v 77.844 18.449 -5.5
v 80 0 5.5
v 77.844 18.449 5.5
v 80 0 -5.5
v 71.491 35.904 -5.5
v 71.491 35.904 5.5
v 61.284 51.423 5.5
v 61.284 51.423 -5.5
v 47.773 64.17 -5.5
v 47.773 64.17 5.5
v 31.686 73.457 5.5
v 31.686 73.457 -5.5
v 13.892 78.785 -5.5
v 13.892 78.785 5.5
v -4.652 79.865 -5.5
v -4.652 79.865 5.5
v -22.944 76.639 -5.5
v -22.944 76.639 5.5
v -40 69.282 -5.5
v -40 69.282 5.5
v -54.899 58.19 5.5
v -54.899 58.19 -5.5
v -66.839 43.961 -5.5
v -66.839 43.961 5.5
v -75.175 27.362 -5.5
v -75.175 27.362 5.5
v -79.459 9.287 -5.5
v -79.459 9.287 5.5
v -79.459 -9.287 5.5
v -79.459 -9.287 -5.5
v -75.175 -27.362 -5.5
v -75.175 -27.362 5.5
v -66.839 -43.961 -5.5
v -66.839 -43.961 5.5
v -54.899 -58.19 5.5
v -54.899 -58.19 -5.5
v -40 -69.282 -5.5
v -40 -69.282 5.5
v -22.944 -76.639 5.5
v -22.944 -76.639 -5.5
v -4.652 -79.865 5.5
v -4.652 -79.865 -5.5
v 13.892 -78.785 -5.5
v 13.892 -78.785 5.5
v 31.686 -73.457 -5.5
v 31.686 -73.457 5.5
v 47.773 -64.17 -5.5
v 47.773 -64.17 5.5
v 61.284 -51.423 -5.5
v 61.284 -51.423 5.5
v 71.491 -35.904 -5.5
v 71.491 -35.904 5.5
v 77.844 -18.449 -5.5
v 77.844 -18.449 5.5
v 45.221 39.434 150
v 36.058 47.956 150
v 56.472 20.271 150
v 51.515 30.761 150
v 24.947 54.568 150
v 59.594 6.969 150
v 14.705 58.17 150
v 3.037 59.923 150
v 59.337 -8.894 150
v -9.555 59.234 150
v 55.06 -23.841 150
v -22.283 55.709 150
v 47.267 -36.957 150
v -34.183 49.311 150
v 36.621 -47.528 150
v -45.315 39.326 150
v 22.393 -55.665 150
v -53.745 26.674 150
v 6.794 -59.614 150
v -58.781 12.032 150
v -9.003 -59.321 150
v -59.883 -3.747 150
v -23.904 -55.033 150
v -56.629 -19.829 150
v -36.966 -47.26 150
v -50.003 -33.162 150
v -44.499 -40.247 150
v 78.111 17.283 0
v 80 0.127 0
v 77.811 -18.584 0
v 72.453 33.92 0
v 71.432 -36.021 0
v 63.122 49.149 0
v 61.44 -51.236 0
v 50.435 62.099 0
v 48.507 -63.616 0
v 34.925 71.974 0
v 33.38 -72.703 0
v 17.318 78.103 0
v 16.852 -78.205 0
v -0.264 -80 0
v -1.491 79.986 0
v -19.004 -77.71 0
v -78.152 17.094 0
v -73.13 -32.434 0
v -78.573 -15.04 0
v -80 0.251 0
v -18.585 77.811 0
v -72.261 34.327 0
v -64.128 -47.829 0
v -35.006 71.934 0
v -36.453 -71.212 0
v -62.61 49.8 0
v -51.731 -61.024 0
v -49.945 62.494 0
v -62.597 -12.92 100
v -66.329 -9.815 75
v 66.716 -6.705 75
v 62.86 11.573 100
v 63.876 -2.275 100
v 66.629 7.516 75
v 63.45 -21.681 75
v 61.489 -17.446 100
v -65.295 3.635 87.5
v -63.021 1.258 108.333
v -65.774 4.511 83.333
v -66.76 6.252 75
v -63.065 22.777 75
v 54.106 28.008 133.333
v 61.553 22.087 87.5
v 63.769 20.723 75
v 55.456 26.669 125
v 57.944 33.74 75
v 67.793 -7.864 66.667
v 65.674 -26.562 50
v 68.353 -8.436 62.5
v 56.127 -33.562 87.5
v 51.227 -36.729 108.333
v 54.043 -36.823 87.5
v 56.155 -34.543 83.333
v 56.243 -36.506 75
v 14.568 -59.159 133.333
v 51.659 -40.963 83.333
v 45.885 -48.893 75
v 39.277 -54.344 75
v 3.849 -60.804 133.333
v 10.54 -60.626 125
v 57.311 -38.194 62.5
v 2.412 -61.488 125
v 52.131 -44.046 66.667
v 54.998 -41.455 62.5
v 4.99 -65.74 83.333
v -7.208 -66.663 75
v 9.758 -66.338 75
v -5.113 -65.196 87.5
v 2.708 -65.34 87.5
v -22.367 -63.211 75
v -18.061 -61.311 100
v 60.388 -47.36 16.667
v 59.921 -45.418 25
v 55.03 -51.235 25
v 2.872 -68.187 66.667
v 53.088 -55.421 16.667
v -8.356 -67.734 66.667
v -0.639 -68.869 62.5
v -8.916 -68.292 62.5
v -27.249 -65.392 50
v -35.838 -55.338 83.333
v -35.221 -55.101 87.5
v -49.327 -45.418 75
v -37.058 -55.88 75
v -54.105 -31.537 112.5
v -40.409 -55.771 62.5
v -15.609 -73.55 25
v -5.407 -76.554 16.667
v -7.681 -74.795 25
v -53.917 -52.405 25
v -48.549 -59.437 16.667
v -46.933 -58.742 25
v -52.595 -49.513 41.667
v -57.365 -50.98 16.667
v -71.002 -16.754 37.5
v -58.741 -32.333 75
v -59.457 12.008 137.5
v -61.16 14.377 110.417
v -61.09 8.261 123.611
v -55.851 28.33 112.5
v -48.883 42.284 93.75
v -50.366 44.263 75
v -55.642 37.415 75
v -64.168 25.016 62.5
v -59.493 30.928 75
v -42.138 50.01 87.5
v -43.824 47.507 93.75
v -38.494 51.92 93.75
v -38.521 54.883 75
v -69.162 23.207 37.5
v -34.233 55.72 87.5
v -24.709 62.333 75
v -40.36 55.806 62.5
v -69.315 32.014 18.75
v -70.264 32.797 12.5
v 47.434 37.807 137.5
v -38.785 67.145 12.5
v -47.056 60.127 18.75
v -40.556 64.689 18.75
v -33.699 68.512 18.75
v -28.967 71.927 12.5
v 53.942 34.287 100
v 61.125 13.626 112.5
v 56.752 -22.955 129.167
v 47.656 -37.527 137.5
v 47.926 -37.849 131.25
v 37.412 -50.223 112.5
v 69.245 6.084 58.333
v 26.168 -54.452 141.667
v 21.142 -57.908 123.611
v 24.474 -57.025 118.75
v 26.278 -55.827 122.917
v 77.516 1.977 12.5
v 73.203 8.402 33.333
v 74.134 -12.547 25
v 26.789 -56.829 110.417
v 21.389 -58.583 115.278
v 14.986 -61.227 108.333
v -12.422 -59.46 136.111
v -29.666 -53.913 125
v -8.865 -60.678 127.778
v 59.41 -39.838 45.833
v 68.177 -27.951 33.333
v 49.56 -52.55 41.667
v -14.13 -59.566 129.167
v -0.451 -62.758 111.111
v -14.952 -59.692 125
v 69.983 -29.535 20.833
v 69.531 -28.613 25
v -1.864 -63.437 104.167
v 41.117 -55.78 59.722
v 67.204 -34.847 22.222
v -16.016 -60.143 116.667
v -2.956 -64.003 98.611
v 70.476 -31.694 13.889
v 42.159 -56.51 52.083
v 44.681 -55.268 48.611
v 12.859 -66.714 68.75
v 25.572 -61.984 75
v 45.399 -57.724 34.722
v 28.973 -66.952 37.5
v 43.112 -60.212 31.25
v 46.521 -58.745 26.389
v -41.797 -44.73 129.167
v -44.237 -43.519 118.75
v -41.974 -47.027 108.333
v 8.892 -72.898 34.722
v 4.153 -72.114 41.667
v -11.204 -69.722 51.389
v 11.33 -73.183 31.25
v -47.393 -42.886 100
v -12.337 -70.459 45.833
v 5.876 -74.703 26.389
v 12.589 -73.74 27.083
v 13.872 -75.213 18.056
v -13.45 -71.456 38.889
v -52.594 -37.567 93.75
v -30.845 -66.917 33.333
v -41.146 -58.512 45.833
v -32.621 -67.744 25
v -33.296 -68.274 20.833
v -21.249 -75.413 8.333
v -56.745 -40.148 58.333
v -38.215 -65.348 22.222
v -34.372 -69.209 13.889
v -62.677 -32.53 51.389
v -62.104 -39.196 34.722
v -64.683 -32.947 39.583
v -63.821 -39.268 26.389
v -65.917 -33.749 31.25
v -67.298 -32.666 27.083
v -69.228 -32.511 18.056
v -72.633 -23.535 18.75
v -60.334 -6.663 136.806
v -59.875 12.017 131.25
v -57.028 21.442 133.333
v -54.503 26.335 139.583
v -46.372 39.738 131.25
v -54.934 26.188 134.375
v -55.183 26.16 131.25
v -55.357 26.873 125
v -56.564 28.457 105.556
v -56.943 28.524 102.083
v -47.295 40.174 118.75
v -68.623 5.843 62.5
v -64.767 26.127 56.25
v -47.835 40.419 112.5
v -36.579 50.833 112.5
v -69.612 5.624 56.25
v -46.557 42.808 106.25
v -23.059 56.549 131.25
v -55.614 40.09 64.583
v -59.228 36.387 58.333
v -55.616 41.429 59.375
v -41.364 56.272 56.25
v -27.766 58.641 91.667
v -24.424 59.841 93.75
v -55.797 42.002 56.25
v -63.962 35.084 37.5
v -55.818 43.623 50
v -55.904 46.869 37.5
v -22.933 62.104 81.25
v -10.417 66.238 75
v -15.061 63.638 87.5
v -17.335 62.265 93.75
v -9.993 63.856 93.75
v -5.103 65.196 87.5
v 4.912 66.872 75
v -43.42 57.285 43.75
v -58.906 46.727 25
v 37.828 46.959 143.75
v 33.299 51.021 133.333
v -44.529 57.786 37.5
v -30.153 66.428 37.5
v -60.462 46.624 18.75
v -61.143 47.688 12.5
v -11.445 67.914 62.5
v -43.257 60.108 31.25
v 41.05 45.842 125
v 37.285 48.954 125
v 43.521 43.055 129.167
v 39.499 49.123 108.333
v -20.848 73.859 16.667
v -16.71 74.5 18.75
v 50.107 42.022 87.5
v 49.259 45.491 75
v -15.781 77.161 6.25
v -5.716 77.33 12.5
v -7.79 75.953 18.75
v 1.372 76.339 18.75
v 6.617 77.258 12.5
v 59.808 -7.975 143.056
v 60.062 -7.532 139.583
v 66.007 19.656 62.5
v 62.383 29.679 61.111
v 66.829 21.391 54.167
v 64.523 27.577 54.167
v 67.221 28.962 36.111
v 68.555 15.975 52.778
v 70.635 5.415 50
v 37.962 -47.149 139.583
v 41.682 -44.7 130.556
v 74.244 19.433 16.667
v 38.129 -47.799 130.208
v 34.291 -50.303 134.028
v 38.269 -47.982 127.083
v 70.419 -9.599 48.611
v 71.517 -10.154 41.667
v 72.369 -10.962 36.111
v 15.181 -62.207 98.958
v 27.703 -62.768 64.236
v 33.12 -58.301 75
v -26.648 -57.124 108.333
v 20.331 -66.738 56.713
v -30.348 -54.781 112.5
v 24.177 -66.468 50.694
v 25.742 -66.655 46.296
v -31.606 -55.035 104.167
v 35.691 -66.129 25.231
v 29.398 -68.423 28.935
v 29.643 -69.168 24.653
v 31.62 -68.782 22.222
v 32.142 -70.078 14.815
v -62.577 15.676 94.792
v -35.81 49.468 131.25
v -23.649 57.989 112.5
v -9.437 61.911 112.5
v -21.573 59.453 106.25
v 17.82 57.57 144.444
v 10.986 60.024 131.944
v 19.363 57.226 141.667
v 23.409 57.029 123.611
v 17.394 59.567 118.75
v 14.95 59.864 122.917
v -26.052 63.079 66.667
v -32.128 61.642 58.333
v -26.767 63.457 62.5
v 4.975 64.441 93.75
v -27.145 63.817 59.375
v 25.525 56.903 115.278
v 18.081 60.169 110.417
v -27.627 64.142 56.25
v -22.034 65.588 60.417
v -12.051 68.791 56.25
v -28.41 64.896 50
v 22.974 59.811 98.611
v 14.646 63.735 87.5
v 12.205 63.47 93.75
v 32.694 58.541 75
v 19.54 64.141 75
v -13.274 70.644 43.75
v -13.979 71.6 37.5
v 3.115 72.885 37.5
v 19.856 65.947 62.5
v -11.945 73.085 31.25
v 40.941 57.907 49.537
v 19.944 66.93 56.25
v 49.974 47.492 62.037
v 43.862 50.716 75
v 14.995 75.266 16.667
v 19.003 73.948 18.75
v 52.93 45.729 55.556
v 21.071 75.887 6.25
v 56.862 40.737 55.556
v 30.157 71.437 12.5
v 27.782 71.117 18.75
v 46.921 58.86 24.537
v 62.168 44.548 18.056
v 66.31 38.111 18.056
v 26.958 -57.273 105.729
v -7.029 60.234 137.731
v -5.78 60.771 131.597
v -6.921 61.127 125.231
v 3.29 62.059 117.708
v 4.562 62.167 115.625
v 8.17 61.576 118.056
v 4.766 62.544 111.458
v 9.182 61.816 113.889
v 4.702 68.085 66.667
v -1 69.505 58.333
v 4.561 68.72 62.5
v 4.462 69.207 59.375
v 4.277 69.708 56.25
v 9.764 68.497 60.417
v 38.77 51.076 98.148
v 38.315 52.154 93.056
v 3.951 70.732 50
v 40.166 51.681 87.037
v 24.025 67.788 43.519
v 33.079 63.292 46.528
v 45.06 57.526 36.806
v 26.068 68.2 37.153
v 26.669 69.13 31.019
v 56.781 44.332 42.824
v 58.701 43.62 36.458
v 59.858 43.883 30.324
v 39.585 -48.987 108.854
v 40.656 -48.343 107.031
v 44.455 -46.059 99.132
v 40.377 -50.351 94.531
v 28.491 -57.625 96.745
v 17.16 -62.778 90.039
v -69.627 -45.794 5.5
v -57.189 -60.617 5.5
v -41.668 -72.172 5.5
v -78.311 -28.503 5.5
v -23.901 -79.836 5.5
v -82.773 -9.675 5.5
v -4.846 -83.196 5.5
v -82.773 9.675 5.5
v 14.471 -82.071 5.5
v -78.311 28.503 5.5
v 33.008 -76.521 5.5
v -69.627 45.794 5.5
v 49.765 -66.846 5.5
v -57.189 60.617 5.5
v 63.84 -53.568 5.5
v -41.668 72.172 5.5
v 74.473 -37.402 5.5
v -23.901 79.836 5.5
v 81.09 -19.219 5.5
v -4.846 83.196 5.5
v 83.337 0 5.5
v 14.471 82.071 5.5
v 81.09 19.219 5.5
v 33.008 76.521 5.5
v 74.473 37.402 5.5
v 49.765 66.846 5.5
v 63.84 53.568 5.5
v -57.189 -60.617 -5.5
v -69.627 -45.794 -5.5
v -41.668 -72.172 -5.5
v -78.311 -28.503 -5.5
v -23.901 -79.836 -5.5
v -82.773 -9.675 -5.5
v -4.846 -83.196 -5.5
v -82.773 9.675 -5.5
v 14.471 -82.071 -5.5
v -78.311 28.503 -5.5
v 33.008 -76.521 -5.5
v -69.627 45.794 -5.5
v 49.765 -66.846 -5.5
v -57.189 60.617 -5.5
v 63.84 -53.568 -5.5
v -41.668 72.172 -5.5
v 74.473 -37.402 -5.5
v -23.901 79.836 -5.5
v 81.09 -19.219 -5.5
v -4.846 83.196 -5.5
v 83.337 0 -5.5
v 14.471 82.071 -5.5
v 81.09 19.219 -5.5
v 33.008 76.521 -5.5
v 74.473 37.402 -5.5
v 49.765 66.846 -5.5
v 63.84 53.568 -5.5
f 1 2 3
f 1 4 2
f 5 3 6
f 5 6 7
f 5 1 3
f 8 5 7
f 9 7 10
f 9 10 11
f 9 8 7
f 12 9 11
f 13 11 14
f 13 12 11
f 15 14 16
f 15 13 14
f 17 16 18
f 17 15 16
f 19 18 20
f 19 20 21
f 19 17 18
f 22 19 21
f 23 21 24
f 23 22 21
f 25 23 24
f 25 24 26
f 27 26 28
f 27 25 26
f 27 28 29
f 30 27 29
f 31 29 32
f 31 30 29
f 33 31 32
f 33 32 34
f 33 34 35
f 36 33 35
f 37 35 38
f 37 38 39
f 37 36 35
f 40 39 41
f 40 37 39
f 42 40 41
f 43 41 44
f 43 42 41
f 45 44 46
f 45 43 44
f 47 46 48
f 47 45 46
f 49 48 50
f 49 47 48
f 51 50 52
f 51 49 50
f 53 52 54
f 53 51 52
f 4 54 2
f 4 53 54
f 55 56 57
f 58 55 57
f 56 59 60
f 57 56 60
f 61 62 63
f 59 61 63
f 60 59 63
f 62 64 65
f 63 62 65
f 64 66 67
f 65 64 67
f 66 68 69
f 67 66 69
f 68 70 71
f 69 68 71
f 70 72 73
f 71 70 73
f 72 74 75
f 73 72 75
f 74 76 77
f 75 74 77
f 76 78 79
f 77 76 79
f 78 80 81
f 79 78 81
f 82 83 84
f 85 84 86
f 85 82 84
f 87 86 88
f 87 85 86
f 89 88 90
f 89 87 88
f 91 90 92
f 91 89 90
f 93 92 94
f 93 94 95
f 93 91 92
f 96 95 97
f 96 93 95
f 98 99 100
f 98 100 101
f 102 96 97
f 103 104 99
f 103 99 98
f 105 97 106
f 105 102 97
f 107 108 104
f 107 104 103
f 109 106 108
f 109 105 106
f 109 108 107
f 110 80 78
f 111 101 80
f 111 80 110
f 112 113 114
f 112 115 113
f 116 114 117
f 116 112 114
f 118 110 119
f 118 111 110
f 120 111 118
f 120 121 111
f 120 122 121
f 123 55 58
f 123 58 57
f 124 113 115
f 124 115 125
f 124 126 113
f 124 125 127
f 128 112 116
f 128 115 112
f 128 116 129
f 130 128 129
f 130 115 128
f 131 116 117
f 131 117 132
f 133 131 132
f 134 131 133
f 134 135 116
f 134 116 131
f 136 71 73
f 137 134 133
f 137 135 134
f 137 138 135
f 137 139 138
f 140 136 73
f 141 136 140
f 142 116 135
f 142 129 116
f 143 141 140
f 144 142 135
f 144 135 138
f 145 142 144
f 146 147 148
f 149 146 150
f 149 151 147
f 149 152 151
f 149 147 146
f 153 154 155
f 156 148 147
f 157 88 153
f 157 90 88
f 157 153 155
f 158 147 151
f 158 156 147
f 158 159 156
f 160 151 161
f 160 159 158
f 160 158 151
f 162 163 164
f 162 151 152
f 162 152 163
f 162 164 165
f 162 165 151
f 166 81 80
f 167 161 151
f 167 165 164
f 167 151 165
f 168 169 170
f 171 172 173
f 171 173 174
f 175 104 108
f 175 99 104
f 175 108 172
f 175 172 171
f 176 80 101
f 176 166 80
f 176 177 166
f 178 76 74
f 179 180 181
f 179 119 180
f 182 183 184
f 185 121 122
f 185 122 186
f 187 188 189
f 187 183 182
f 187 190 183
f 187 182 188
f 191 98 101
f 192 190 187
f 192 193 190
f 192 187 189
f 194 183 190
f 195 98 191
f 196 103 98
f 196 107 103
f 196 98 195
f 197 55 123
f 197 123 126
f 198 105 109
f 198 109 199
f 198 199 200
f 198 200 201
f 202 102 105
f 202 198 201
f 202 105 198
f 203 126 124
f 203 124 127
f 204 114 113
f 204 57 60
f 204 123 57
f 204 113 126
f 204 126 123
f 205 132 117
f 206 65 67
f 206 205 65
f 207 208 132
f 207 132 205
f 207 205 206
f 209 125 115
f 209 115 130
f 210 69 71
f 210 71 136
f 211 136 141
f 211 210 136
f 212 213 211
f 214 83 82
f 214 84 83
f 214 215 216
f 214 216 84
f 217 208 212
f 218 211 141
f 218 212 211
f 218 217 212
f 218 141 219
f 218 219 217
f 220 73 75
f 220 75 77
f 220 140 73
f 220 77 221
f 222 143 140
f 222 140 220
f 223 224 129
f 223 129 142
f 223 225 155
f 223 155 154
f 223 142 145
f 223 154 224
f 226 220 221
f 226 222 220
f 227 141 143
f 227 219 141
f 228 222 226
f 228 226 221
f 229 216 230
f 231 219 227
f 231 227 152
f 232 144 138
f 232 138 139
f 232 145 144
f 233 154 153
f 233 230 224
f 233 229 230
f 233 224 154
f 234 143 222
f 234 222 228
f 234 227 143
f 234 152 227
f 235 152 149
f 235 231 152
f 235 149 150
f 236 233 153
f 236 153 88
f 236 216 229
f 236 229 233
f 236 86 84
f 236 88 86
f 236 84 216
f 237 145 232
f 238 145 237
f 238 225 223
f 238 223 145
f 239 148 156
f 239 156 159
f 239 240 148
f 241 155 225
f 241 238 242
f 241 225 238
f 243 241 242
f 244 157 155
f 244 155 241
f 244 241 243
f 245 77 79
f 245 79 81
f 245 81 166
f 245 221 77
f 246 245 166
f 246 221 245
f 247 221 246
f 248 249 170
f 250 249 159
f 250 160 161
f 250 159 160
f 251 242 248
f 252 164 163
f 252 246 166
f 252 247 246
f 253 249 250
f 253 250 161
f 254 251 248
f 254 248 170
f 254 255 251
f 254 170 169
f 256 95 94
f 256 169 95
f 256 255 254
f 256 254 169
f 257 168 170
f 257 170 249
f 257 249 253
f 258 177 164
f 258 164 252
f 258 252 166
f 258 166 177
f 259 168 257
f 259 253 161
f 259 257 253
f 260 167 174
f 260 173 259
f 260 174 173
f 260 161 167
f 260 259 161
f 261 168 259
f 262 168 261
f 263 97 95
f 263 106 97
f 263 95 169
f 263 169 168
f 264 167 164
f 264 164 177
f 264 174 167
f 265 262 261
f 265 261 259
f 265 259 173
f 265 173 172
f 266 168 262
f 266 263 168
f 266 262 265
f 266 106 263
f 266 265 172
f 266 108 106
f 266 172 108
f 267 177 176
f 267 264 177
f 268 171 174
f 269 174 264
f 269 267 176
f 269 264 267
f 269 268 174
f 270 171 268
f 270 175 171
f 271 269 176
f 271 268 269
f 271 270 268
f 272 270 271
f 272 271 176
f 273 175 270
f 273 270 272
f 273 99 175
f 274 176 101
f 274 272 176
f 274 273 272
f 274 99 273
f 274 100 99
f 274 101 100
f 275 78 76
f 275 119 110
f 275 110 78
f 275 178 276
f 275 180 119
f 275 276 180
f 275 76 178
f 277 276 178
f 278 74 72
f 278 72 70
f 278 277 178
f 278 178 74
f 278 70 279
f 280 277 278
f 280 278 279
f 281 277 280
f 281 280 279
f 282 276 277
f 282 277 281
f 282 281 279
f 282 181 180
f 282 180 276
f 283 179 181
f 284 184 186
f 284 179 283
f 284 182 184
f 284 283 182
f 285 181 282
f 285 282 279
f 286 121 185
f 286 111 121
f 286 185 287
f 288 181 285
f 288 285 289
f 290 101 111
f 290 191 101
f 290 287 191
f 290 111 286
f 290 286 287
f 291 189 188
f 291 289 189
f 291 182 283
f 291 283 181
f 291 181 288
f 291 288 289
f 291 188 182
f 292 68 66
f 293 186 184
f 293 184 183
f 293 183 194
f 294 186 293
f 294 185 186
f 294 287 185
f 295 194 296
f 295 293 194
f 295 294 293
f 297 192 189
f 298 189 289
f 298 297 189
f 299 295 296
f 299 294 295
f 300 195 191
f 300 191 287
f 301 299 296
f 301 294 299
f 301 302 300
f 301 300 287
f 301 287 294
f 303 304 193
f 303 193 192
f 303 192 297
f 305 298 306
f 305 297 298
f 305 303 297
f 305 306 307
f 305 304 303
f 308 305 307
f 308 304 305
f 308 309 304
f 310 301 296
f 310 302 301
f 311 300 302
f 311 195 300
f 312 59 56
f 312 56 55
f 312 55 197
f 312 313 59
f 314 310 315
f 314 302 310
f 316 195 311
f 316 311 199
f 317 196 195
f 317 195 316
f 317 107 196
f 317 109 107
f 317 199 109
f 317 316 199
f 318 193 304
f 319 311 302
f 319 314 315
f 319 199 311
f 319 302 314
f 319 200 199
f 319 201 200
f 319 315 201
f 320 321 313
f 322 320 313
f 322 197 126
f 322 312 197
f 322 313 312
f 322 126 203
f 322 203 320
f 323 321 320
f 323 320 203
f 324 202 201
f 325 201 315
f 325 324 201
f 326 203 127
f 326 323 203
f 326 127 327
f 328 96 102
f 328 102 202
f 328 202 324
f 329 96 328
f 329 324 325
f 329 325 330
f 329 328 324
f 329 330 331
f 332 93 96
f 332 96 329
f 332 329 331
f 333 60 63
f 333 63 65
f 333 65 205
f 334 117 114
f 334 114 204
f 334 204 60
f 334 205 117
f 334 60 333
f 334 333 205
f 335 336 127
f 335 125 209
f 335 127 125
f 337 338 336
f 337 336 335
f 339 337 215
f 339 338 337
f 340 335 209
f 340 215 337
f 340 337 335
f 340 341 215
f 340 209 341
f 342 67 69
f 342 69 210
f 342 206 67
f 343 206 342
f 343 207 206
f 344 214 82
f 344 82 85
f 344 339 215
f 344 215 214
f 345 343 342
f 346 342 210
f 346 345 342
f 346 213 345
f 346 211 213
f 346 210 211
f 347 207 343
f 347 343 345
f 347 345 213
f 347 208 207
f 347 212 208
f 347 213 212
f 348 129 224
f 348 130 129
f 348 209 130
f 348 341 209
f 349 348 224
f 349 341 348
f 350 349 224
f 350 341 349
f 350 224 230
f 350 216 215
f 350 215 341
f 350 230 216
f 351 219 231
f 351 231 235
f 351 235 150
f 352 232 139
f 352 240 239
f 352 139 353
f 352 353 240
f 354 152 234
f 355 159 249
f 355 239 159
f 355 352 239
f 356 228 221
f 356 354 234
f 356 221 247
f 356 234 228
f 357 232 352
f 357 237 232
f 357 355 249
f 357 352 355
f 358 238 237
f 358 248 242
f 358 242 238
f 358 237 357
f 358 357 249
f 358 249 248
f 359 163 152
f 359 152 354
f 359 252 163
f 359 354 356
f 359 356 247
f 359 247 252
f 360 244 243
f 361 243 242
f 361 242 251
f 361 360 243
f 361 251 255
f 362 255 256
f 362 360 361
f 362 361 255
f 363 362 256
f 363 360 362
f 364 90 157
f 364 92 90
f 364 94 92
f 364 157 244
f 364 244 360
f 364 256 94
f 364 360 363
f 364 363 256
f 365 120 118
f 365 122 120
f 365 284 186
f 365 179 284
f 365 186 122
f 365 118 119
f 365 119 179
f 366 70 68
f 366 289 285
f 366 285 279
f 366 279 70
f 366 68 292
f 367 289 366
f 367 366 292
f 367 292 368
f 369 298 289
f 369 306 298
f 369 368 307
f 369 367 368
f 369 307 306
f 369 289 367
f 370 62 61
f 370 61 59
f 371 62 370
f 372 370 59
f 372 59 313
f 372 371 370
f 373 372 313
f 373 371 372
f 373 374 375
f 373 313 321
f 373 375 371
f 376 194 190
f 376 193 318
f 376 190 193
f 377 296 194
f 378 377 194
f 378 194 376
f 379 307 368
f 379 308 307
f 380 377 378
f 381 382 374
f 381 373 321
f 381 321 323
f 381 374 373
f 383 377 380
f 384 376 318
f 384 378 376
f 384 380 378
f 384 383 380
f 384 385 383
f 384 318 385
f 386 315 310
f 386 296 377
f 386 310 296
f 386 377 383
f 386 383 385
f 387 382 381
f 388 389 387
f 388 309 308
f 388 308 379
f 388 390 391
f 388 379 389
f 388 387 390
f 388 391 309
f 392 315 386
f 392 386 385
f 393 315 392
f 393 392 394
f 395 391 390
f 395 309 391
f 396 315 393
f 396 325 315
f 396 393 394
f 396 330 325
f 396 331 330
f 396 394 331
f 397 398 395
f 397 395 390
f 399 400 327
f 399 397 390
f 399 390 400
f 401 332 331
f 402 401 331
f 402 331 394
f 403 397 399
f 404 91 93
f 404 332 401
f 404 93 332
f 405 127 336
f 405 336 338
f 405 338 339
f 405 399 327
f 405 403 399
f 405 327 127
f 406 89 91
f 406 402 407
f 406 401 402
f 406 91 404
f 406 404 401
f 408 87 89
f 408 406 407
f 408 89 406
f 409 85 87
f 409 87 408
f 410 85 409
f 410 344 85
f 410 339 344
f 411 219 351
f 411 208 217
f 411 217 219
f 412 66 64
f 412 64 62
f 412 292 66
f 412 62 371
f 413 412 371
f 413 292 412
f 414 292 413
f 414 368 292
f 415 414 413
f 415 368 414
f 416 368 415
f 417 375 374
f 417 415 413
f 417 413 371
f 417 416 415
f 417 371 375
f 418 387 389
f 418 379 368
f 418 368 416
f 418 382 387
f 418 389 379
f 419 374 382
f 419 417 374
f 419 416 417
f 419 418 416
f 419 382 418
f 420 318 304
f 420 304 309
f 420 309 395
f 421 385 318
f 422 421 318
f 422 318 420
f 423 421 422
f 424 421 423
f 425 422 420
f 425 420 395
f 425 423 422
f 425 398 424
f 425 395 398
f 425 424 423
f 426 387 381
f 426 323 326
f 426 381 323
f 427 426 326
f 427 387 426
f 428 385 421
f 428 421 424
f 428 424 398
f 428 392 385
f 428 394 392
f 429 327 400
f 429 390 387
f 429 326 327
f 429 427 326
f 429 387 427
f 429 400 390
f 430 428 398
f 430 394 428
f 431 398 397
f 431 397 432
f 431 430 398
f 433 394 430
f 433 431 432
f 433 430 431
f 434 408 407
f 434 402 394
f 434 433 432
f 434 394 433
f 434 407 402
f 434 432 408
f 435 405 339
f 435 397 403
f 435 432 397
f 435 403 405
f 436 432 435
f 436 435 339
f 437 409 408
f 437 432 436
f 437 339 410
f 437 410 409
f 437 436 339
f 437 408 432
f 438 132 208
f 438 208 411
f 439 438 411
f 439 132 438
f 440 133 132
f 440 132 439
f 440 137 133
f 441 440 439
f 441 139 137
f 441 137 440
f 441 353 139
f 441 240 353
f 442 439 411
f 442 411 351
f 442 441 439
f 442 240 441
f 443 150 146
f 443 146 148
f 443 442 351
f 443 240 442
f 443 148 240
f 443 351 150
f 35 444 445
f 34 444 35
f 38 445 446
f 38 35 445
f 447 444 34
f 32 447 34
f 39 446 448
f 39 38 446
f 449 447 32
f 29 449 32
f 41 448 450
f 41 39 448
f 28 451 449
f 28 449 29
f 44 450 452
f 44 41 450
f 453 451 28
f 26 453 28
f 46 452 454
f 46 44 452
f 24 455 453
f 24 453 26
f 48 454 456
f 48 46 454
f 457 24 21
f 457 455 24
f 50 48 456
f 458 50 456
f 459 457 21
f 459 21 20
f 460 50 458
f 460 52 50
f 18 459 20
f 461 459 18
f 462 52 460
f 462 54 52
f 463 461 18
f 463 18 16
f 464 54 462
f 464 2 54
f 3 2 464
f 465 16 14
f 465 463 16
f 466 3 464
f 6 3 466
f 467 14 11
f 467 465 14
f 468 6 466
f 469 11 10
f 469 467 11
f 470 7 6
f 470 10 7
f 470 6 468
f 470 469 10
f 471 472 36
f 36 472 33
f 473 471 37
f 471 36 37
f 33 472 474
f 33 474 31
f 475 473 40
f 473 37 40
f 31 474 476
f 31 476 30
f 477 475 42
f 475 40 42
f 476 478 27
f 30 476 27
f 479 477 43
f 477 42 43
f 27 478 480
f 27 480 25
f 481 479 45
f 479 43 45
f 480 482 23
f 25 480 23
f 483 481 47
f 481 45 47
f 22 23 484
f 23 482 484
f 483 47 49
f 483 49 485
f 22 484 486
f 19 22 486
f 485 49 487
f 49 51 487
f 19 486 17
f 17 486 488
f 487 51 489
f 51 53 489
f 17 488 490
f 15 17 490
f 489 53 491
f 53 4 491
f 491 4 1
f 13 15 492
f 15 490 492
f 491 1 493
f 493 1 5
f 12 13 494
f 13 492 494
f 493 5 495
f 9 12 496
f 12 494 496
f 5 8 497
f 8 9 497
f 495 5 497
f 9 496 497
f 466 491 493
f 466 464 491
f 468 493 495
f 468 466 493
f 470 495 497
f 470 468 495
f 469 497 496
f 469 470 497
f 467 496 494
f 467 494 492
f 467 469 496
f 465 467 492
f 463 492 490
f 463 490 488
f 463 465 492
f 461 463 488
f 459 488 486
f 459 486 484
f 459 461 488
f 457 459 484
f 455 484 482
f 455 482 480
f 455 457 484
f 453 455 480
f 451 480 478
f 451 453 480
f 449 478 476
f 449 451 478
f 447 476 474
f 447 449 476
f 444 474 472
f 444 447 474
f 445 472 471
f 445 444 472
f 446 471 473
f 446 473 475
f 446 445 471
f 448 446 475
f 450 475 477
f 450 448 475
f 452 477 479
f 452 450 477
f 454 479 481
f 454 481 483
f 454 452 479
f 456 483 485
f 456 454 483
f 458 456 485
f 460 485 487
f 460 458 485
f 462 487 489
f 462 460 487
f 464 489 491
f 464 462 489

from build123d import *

# Parameters (mm, degrees)
SKETCH1_5_R         = 83.336833521
SKETCH1_5_R_2       = 80
BOSS_EXTRUDE1_DEPTH = 5.5


with BuildPart() as part:
    # Loft1: read off the stored shape, not the designer's step
    # Loft1: loft between two sections, ruled curve by curve
    loft1_from = [
        Edge.make_bspline([(-50.003073395, -33.16161412, 150), (-116.326301635, 66.844532671, 150), (-16.320154844, 133.16776091, 150), (50.003073395, 33.16161412, 150), (116.326301635, -66.844532671, 150), (16.320154844, -133.16776091, 150), (-50.003073395, -33.16161412, 150)], [0, 0, 0, 0, 0.5, 0.5, 0.5, 1, 1, 1, 1], 3, [1, 0.333333333, 0.333333333, 1, 0.333333333, 0.333333333, 1]),
    ]
    loft1_to = [
        Edge.make_bspline([(-79.999605216, 0.251326999, 0), (-79.496951218, 160.250537431, 0), (80.502259214, 159.747883433, 0), (79.999605216, -0.251326999, 0), (79.496951218, -160.250537431, 0), (-80.502259214, -159.747883433, 0), (-79.999605216, 0.251326999, 0)], [0, 0, 0, 0, 0.5, 0.5, 0.5, 1, 1, 1, 1], 3, [1, 0.333333333, 0.333333333, 1, 0.333333333, 0.333333333, 1]),
    ]
    loft1 = Solid(Shell([*[Face.make_surface_from_curves(loft1_from[k], loft1_to[k]) for k in range(1)], Face(Wire(loft1_from)), Face(Wire(loft1_to))]))
    add(loft1)


with BuildPart() as body_2:
    # Sketch1<5> → Boss-Extrude1 (new, symmetric)
    with BuildSketch(Plane.XY):
        Circle(SKETCH1_5_R)
        Circle(SKETCH1_5_R_2, mode=Mode.SUBTRACT)
    extrude(amount=BOSS_EXTRUDE1_DEPTH, both=True)


solid = Compound([part.part, body_2.part])
